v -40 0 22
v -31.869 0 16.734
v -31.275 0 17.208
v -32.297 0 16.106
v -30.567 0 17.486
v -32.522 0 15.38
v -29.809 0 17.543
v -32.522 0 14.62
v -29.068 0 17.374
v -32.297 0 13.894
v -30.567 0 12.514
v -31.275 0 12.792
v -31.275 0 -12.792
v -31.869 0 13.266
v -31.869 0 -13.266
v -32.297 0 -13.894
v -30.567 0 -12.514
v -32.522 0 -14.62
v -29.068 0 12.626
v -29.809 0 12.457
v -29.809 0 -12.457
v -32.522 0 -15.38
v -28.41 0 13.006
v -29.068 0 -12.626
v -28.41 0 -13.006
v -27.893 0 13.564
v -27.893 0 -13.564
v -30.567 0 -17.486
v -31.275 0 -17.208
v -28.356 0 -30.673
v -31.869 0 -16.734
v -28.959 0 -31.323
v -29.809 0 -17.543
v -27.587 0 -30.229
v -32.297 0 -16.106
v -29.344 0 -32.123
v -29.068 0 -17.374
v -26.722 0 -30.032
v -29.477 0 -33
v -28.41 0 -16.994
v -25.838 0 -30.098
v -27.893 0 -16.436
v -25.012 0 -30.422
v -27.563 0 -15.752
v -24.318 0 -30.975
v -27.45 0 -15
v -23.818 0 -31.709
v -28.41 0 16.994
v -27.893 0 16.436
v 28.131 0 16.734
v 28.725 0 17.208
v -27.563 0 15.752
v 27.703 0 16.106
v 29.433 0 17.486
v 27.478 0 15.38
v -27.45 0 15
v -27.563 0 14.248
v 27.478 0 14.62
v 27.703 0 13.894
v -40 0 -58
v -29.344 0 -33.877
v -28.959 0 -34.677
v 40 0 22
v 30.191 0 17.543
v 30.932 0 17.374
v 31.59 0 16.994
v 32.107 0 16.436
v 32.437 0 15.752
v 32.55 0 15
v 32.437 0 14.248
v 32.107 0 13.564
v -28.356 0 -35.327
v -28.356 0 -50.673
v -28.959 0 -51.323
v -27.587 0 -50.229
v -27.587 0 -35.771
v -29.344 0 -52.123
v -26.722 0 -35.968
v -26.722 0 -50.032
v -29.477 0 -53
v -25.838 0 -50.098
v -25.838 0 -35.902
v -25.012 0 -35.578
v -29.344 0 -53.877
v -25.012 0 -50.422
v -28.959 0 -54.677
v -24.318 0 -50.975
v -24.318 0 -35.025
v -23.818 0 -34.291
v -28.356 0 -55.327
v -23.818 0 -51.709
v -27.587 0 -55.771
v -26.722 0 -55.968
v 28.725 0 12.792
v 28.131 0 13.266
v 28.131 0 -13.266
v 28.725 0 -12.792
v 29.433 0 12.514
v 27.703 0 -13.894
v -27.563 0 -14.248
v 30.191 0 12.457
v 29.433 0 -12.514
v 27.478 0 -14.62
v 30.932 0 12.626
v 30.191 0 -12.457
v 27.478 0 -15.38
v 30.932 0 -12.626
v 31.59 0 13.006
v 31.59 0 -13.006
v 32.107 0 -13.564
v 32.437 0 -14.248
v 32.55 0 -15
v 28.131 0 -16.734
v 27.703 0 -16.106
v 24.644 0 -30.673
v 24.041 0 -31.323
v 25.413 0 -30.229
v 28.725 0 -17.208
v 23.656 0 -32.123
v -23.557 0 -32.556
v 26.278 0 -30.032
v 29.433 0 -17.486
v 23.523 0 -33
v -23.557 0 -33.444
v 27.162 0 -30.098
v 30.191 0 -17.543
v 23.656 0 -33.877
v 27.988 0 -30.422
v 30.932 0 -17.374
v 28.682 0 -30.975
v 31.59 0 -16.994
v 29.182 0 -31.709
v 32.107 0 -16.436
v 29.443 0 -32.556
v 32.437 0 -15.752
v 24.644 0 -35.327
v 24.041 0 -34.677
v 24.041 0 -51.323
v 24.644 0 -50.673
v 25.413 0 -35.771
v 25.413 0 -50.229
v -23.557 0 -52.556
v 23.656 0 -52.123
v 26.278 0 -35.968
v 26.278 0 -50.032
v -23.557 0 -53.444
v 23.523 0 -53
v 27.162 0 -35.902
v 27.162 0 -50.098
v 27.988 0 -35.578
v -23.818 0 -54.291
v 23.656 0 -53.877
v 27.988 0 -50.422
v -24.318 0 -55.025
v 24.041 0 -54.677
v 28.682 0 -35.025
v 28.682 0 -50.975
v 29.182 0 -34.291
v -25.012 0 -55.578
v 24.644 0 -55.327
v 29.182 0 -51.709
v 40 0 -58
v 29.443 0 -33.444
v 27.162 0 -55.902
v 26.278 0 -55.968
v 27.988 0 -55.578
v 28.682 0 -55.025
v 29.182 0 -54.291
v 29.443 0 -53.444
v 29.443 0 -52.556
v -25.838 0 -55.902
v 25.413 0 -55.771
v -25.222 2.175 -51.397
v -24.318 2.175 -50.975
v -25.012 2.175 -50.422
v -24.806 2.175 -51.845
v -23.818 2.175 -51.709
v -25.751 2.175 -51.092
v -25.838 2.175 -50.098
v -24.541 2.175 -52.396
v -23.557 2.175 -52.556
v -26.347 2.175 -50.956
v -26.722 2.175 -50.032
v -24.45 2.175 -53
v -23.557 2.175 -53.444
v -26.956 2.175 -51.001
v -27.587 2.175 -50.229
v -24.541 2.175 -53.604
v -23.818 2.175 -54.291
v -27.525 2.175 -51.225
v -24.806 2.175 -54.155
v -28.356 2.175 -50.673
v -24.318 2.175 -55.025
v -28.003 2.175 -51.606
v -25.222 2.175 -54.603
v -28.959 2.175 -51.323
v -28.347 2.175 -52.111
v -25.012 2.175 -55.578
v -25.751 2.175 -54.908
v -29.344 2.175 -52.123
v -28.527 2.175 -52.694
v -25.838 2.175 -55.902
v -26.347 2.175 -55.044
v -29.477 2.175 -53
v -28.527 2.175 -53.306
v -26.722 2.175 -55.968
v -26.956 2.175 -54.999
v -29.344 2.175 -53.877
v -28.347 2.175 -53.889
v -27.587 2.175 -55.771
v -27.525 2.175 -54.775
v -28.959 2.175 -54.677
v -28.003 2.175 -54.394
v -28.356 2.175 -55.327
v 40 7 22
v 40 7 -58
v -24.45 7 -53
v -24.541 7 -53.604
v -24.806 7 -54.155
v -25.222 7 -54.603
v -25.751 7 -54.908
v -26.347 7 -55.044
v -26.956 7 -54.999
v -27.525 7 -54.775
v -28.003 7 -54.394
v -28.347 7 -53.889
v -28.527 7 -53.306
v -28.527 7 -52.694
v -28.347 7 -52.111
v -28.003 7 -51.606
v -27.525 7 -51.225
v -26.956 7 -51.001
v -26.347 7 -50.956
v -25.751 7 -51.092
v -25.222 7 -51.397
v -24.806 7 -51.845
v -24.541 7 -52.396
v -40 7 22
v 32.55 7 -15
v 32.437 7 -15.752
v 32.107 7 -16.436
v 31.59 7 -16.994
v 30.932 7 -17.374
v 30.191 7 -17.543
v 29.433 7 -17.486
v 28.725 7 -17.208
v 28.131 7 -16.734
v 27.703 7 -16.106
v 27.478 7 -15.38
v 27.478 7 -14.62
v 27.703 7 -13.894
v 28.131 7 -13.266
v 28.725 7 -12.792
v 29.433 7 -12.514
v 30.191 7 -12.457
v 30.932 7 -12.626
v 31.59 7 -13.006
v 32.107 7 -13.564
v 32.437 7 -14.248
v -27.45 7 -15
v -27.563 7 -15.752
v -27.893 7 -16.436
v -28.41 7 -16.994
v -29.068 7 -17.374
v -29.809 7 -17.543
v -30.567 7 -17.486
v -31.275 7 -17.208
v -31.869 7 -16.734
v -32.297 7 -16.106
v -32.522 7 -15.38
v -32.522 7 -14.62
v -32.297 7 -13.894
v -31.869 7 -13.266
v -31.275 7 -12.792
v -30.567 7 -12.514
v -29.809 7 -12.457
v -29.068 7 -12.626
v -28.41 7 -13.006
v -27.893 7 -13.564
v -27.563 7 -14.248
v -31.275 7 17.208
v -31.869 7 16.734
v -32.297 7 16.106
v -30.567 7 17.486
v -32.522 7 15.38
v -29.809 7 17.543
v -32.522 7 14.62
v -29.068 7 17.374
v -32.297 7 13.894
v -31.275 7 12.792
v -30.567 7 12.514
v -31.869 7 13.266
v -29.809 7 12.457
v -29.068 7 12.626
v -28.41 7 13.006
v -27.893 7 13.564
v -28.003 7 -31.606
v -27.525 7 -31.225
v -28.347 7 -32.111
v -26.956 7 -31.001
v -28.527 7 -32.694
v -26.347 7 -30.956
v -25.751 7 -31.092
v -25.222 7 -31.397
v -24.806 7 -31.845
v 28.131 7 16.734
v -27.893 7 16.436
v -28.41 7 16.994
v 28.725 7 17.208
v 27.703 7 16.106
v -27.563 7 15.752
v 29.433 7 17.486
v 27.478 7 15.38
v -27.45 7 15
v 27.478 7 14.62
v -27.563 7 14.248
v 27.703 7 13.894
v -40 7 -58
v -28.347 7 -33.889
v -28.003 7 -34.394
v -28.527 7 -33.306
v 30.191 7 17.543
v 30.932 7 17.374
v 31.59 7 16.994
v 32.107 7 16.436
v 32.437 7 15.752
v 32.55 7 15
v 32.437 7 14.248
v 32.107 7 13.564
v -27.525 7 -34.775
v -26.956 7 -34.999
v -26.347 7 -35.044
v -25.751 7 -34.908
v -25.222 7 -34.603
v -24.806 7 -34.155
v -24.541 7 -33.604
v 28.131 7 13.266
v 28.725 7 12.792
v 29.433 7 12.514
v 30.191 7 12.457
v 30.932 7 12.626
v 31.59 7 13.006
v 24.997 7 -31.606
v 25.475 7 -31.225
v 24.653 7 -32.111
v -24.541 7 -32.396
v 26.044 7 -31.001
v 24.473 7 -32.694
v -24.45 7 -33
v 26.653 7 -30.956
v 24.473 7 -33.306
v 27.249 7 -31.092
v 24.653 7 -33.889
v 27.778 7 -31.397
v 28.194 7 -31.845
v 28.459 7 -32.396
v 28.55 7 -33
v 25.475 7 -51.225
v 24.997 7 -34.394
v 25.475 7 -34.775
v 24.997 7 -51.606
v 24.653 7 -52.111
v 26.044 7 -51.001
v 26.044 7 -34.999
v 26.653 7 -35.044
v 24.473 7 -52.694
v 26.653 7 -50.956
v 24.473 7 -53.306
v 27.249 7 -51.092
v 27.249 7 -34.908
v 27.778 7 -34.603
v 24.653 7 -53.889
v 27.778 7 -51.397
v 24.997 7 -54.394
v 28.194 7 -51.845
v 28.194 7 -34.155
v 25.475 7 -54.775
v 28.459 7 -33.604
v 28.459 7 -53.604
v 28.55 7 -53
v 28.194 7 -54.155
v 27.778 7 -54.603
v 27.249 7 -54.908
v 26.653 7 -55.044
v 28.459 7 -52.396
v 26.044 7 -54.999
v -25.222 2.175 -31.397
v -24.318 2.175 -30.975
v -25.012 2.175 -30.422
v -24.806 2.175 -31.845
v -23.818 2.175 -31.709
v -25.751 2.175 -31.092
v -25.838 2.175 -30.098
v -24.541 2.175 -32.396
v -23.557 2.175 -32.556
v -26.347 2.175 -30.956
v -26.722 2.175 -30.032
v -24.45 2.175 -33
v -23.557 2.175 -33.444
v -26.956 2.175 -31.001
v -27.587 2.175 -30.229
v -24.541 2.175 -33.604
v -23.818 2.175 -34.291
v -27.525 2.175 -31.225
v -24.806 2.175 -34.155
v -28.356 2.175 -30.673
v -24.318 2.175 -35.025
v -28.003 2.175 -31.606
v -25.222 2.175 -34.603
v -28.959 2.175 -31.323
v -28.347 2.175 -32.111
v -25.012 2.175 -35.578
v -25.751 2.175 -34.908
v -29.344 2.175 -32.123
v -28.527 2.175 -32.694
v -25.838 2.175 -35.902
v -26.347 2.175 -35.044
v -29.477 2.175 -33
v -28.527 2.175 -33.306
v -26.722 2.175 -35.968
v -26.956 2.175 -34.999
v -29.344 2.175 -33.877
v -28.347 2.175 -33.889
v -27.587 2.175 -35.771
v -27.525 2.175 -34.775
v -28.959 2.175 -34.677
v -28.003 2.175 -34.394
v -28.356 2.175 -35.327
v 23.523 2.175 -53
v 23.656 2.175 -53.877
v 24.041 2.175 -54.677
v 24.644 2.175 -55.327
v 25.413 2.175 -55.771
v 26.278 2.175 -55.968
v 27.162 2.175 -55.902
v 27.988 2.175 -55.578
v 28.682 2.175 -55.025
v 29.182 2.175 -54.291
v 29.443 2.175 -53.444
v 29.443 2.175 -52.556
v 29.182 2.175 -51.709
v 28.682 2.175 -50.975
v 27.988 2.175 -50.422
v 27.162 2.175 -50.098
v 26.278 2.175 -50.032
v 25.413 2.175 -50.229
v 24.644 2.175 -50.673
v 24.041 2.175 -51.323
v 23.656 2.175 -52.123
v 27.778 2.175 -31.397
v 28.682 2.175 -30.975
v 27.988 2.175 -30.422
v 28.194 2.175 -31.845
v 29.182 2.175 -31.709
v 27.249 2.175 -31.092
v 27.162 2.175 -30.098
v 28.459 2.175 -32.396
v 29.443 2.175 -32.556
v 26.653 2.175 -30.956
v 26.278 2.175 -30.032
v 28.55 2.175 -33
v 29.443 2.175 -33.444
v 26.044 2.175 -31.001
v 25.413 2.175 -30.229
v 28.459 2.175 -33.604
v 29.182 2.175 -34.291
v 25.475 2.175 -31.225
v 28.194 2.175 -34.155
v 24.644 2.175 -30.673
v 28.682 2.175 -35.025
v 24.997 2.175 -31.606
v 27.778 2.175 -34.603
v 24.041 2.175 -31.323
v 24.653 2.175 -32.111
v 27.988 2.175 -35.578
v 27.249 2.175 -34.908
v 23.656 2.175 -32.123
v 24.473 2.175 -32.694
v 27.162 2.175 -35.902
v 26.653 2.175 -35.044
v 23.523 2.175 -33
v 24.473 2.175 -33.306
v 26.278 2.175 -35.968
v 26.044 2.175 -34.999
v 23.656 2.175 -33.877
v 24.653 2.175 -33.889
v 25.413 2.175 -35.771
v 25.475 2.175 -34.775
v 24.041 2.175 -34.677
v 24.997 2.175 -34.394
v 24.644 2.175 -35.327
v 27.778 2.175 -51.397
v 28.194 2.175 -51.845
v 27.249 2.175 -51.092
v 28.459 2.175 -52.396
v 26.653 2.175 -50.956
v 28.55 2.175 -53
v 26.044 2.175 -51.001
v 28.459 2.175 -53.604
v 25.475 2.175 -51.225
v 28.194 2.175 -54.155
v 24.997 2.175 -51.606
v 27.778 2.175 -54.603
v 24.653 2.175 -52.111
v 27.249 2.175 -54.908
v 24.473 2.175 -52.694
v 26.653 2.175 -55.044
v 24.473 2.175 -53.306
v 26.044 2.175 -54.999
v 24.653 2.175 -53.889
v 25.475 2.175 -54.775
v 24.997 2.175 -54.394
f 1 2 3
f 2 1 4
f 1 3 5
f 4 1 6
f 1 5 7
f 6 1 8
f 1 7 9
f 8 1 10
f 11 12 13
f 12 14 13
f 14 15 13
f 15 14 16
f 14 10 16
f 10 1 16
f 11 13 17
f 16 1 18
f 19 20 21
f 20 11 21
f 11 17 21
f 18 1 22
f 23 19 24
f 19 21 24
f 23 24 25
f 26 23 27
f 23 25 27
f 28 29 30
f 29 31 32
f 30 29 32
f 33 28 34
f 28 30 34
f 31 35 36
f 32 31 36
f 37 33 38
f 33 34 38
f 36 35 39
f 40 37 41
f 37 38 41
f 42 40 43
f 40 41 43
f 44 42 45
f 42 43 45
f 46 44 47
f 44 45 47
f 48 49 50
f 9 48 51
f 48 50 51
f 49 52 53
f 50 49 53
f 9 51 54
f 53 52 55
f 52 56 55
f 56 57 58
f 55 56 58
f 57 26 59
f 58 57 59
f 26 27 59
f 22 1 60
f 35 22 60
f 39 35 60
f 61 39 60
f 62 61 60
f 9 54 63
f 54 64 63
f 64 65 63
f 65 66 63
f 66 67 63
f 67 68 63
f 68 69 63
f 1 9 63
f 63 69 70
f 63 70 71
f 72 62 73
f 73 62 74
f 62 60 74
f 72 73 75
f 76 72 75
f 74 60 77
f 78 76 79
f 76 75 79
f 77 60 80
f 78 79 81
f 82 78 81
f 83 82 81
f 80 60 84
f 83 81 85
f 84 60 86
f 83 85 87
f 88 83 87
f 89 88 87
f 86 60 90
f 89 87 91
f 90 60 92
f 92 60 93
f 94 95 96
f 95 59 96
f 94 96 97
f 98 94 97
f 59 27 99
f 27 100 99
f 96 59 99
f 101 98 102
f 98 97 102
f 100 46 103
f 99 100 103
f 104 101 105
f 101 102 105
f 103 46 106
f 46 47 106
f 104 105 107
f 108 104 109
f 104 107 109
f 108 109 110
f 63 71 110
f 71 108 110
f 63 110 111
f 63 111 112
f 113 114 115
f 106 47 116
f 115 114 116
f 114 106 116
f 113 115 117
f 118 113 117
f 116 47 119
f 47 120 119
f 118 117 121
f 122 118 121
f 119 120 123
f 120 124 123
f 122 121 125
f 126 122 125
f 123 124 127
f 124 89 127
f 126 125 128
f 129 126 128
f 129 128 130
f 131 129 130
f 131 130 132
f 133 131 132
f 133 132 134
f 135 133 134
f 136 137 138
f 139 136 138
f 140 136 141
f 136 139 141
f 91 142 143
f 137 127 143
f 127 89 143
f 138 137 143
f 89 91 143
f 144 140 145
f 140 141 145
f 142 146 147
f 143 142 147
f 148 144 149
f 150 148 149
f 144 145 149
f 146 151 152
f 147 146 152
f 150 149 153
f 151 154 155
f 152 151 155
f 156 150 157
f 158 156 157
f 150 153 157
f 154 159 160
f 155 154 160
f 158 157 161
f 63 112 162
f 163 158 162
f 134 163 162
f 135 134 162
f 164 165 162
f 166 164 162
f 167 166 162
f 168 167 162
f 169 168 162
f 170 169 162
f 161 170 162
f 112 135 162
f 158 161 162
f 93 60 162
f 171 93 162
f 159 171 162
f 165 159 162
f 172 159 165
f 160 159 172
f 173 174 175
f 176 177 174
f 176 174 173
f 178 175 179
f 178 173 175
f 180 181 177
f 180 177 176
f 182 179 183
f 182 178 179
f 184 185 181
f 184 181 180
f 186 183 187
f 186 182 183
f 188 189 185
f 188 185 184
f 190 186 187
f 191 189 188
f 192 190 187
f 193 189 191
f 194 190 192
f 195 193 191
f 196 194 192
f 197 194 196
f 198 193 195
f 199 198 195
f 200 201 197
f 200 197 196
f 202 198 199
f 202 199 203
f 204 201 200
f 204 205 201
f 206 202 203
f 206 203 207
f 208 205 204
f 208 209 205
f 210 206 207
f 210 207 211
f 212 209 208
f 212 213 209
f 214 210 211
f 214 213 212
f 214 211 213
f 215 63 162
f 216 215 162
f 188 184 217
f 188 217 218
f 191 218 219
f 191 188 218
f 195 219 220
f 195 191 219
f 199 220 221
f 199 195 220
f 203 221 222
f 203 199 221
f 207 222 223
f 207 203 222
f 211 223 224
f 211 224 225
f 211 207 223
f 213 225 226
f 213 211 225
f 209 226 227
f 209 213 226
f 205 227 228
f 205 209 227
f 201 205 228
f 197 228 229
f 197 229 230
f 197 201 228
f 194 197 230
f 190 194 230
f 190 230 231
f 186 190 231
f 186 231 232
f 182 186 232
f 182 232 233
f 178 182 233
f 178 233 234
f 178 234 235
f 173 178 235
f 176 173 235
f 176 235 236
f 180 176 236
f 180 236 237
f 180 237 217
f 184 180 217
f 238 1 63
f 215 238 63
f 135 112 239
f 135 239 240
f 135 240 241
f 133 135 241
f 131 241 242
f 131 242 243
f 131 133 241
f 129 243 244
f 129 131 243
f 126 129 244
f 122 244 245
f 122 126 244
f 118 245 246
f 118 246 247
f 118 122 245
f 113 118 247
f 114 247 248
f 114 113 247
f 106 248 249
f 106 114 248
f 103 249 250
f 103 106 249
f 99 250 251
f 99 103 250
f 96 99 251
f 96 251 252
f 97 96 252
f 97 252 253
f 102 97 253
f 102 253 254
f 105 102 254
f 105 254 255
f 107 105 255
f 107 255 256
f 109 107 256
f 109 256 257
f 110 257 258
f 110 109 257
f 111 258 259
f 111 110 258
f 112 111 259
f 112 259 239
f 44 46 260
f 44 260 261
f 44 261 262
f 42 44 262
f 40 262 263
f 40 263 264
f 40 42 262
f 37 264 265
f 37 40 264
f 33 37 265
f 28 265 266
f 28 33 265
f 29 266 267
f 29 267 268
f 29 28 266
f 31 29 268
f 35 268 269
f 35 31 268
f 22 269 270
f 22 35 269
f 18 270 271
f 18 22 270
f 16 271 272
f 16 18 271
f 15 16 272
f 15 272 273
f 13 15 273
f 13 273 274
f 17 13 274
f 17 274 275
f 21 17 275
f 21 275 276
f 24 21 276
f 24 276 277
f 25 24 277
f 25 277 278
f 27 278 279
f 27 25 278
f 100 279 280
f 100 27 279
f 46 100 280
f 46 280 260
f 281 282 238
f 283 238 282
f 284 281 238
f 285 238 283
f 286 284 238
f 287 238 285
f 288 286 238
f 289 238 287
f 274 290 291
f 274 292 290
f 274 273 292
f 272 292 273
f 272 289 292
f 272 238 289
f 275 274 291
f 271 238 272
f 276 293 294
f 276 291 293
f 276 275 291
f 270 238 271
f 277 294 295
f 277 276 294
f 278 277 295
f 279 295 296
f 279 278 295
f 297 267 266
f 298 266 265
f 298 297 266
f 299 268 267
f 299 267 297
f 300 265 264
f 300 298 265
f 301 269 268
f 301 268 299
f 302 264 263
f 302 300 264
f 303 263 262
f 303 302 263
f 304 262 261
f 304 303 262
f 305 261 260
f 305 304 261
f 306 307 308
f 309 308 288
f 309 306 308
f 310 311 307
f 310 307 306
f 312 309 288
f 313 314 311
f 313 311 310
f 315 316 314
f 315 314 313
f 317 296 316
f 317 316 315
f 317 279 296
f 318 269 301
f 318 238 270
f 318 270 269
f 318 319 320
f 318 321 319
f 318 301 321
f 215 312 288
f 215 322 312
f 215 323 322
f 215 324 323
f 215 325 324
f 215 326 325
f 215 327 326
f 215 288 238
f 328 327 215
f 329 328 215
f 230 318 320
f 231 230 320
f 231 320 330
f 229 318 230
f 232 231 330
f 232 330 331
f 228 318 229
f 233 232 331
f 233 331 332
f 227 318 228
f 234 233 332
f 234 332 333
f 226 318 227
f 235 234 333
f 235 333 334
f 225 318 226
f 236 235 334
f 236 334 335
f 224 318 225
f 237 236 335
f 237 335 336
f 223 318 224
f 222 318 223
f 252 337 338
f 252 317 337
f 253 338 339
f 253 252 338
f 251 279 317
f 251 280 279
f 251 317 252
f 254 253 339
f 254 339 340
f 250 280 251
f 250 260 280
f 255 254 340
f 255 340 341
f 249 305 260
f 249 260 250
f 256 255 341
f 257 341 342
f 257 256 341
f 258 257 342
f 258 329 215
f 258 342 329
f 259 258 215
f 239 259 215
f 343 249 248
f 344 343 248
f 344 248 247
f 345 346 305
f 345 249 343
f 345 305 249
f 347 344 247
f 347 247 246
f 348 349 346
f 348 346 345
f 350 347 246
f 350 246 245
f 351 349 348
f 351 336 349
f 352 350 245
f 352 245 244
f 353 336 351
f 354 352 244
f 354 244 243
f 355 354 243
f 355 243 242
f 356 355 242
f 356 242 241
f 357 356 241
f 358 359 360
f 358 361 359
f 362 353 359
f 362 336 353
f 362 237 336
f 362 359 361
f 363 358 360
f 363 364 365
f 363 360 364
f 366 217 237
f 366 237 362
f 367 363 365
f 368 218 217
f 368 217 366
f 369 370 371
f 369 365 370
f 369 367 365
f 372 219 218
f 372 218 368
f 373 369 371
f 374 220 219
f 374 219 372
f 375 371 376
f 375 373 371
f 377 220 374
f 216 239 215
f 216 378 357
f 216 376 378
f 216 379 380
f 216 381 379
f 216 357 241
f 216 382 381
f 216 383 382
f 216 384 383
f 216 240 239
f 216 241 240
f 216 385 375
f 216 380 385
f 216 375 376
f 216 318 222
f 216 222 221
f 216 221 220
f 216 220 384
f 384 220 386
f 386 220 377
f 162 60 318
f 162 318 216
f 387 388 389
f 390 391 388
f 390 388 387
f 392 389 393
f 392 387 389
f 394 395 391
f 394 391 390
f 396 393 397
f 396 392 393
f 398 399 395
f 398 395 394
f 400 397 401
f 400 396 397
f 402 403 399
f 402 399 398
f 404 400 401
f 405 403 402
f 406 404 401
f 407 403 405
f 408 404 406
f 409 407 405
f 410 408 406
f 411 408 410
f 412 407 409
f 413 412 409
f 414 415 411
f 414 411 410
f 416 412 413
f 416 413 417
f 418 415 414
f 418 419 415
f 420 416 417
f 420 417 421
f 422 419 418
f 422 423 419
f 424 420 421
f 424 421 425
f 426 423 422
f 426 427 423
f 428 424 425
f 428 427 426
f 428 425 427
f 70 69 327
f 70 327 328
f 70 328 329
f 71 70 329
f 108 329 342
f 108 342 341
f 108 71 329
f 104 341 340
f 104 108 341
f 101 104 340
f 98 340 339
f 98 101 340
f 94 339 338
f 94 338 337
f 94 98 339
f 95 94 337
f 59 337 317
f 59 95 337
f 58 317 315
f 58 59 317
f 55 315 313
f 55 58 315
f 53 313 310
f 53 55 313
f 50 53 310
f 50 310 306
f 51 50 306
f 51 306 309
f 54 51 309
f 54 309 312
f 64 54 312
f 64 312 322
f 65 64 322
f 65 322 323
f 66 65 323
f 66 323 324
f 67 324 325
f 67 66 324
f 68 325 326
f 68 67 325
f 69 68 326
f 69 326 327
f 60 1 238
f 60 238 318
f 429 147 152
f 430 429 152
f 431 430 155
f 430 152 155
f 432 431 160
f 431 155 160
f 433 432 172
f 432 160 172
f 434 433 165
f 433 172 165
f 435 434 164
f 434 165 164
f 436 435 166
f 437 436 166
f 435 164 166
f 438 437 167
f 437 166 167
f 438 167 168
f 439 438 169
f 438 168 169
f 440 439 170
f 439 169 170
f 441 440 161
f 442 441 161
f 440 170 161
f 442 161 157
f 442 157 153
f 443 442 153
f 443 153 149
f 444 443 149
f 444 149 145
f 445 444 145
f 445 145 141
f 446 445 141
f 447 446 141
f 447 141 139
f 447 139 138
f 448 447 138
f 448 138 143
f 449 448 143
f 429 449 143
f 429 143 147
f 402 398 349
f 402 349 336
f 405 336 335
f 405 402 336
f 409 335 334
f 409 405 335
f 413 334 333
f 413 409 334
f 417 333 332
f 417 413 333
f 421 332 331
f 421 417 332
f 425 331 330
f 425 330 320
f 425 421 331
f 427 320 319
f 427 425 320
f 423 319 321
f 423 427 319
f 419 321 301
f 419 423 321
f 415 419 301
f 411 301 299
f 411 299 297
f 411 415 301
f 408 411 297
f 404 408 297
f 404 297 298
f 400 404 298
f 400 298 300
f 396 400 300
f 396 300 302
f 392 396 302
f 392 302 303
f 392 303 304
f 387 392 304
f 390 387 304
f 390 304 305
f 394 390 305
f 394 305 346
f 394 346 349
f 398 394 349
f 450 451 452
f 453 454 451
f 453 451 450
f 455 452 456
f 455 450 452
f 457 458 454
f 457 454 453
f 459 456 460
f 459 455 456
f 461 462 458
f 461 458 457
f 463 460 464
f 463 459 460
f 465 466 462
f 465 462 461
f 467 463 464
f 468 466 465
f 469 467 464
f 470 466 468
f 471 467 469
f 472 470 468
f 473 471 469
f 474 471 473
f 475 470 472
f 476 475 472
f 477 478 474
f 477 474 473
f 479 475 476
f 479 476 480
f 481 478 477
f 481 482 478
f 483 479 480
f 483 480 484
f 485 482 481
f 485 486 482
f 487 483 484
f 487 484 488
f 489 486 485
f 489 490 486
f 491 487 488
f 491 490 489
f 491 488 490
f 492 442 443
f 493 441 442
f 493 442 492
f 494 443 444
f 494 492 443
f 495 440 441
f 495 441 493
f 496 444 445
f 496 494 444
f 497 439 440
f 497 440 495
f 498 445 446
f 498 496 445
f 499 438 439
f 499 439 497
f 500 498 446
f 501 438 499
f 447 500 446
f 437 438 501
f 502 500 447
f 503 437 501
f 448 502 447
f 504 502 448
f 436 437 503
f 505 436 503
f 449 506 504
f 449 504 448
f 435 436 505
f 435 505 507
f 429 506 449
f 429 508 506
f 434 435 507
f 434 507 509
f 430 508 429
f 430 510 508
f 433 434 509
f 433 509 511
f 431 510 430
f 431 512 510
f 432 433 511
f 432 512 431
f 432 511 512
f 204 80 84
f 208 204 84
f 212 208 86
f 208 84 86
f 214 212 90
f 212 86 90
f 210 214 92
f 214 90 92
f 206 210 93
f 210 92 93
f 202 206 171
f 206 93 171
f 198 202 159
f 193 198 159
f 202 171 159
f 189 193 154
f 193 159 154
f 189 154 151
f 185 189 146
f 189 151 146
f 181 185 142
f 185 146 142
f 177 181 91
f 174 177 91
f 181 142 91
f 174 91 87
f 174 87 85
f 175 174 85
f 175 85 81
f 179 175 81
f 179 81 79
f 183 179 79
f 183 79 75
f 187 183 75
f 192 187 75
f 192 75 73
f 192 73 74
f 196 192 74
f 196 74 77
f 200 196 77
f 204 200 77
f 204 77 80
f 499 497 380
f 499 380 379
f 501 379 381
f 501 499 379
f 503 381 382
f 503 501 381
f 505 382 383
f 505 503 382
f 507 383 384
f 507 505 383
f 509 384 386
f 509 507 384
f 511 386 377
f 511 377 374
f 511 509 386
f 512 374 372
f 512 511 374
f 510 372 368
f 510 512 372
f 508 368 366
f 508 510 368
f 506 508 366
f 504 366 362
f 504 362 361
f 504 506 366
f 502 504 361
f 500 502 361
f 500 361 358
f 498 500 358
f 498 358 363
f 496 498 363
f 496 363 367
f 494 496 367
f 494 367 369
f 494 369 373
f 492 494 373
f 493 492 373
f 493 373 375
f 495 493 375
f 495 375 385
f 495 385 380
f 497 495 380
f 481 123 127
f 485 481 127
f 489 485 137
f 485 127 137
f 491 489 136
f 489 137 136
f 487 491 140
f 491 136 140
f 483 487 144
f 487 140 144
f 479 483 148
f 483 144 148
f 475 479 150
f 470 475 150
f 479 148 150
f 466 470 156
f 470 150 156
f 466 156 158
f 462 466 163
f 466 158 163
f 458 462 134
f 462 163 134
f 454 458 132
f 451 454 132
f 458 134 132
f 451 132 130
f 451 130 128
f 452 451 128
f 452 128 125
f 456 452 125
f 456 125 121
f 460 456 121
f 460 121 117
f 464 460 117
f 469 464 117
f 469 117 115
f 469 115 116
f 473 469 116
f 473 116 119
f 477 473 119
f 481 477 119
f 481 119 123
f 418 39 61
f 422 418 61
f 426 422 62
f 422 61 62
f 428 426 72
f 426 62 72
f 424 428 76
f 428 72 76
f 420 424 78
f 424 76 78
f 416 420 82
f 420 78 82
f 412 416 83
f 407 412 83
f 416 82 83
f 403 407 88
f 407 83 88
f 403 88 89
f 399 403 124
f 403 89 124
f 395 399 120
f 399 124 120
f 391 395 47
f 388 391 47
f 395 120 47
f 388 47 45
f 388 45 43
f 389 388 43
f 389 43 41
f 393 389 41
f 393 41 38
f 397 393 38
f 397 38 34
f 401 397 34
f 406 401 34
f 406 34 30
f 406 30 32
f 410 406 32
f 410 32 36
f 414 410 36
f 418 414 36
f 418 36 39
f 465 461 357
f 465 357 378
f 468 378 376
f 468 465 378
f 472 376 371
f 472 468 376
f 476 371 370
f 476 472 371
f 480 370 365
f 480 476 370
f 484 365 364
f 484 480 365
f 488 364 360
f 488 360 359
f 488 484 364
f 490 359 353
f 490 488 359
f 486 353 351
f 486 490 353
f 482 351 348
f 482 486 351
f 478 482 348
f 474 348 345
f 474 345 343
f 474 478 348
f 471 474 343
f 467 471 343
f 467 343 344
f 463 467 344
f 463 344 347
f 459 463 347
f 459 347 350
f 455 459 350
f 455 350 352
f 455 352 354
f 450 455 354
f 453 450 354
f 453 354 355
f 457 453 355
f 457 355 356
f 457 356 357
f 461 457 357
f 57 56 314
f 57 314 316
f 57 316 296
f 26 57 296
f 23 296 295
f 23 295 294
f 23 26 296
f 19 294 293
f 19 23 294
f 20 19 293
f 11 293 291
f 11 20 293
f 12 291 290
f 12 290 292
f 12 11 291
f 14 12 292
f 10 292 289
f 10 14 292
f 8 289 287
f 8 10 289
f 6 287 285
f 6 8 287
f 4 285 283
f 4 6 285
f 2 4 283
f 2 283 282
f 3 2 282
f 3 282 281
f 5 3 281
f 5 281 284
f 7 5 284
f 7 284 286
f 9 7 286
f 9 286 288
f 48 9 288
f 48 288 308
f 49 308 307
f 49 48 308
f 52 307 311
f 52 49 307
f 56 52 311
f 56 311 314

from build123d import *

# Parameters (mm, degrees)
SKETCH1_W                               = 80
SKETCH1_H                               = 80
SKETCH1_R                               = 2.55
SKETCH1_R_2                             = 2.05
BOSS_EXTRUDE1_DEPTH                     = 7
CBORE_FOR_5_64_EJECTOR_PIN1_D           = 1.984375
CBORE_FOR_5_64_EJECTOR_PIN1_CBORE_D     = 5.953125
CBORE_FOR_5_64_EJECTOR_PIN1_CBORE_DEPTH = 2.175


with BuildPart() as part:
    # Sketch1 → Boss-Extrude1 (new body)
    with BuildSketch(Plane(origin=(0, 0, 0), x_dir=(1, 0, 0), z_dir=(0, 1, 0))):
        with Locations((0, 18)):
            Rectangle(SKETCH1_W, SKETCH1_H)
        with Locations((-30, 15)):
            Circle(SKETCH1_R, mode=Mode.SUBTRACT)
        with Locations((30, 15)):
            Circle(SKETCH1_R, mode=Mode.SUBTRACT)
        with Locations((30, -15)):
            Circle(SKETCH1_R, mode=Mode.SUBTRACT)
        with Locations((-30, -15)):
            Circle(SKETCH1_R, mode=Mode.SUBTRACT)
        with Locations((-26.5, 53)):
            Circle(SKETCH1_R_2, mode=Mode.SUBTRACT)
        with Locations((26.5, 53)):
            Circle(SKETCH1_R_2, mode=Mode.SUBTRACT)
        with Locations((26.5, 33)):
            Circle(SKETCH1_R_2, mode=Mode.SUBTRACT)
        with Locations((-26.5, 33)):
            Circle(SKETCH1_R_2, mode=Mode.SUBTRACT)
    extrude(amount=BOSS_EXTRUDE1_DEPTH)

    # CBORE for 5/64 Ejector Pin1 (through all)
    with Locations(Plane(origin=(0, 0, 0), x_dir=(-1, 0, 0), z_dir=(0, -1, 0))):
        with Locations((26.5, 33), (-26.5, 33), (26.5, 53), (-26.5, 53)):
            CounterBoreHole(CBORE_FOR_5_64_EJECTOR_PIN1_D / 2, CBORE_FOR_5_64_EJECTOR_PIN1_CBORE_D / 2, CBORE_FOR_5_64_EJECTOR_PIN1_CBORE_DEPTH)


solid = part.part
